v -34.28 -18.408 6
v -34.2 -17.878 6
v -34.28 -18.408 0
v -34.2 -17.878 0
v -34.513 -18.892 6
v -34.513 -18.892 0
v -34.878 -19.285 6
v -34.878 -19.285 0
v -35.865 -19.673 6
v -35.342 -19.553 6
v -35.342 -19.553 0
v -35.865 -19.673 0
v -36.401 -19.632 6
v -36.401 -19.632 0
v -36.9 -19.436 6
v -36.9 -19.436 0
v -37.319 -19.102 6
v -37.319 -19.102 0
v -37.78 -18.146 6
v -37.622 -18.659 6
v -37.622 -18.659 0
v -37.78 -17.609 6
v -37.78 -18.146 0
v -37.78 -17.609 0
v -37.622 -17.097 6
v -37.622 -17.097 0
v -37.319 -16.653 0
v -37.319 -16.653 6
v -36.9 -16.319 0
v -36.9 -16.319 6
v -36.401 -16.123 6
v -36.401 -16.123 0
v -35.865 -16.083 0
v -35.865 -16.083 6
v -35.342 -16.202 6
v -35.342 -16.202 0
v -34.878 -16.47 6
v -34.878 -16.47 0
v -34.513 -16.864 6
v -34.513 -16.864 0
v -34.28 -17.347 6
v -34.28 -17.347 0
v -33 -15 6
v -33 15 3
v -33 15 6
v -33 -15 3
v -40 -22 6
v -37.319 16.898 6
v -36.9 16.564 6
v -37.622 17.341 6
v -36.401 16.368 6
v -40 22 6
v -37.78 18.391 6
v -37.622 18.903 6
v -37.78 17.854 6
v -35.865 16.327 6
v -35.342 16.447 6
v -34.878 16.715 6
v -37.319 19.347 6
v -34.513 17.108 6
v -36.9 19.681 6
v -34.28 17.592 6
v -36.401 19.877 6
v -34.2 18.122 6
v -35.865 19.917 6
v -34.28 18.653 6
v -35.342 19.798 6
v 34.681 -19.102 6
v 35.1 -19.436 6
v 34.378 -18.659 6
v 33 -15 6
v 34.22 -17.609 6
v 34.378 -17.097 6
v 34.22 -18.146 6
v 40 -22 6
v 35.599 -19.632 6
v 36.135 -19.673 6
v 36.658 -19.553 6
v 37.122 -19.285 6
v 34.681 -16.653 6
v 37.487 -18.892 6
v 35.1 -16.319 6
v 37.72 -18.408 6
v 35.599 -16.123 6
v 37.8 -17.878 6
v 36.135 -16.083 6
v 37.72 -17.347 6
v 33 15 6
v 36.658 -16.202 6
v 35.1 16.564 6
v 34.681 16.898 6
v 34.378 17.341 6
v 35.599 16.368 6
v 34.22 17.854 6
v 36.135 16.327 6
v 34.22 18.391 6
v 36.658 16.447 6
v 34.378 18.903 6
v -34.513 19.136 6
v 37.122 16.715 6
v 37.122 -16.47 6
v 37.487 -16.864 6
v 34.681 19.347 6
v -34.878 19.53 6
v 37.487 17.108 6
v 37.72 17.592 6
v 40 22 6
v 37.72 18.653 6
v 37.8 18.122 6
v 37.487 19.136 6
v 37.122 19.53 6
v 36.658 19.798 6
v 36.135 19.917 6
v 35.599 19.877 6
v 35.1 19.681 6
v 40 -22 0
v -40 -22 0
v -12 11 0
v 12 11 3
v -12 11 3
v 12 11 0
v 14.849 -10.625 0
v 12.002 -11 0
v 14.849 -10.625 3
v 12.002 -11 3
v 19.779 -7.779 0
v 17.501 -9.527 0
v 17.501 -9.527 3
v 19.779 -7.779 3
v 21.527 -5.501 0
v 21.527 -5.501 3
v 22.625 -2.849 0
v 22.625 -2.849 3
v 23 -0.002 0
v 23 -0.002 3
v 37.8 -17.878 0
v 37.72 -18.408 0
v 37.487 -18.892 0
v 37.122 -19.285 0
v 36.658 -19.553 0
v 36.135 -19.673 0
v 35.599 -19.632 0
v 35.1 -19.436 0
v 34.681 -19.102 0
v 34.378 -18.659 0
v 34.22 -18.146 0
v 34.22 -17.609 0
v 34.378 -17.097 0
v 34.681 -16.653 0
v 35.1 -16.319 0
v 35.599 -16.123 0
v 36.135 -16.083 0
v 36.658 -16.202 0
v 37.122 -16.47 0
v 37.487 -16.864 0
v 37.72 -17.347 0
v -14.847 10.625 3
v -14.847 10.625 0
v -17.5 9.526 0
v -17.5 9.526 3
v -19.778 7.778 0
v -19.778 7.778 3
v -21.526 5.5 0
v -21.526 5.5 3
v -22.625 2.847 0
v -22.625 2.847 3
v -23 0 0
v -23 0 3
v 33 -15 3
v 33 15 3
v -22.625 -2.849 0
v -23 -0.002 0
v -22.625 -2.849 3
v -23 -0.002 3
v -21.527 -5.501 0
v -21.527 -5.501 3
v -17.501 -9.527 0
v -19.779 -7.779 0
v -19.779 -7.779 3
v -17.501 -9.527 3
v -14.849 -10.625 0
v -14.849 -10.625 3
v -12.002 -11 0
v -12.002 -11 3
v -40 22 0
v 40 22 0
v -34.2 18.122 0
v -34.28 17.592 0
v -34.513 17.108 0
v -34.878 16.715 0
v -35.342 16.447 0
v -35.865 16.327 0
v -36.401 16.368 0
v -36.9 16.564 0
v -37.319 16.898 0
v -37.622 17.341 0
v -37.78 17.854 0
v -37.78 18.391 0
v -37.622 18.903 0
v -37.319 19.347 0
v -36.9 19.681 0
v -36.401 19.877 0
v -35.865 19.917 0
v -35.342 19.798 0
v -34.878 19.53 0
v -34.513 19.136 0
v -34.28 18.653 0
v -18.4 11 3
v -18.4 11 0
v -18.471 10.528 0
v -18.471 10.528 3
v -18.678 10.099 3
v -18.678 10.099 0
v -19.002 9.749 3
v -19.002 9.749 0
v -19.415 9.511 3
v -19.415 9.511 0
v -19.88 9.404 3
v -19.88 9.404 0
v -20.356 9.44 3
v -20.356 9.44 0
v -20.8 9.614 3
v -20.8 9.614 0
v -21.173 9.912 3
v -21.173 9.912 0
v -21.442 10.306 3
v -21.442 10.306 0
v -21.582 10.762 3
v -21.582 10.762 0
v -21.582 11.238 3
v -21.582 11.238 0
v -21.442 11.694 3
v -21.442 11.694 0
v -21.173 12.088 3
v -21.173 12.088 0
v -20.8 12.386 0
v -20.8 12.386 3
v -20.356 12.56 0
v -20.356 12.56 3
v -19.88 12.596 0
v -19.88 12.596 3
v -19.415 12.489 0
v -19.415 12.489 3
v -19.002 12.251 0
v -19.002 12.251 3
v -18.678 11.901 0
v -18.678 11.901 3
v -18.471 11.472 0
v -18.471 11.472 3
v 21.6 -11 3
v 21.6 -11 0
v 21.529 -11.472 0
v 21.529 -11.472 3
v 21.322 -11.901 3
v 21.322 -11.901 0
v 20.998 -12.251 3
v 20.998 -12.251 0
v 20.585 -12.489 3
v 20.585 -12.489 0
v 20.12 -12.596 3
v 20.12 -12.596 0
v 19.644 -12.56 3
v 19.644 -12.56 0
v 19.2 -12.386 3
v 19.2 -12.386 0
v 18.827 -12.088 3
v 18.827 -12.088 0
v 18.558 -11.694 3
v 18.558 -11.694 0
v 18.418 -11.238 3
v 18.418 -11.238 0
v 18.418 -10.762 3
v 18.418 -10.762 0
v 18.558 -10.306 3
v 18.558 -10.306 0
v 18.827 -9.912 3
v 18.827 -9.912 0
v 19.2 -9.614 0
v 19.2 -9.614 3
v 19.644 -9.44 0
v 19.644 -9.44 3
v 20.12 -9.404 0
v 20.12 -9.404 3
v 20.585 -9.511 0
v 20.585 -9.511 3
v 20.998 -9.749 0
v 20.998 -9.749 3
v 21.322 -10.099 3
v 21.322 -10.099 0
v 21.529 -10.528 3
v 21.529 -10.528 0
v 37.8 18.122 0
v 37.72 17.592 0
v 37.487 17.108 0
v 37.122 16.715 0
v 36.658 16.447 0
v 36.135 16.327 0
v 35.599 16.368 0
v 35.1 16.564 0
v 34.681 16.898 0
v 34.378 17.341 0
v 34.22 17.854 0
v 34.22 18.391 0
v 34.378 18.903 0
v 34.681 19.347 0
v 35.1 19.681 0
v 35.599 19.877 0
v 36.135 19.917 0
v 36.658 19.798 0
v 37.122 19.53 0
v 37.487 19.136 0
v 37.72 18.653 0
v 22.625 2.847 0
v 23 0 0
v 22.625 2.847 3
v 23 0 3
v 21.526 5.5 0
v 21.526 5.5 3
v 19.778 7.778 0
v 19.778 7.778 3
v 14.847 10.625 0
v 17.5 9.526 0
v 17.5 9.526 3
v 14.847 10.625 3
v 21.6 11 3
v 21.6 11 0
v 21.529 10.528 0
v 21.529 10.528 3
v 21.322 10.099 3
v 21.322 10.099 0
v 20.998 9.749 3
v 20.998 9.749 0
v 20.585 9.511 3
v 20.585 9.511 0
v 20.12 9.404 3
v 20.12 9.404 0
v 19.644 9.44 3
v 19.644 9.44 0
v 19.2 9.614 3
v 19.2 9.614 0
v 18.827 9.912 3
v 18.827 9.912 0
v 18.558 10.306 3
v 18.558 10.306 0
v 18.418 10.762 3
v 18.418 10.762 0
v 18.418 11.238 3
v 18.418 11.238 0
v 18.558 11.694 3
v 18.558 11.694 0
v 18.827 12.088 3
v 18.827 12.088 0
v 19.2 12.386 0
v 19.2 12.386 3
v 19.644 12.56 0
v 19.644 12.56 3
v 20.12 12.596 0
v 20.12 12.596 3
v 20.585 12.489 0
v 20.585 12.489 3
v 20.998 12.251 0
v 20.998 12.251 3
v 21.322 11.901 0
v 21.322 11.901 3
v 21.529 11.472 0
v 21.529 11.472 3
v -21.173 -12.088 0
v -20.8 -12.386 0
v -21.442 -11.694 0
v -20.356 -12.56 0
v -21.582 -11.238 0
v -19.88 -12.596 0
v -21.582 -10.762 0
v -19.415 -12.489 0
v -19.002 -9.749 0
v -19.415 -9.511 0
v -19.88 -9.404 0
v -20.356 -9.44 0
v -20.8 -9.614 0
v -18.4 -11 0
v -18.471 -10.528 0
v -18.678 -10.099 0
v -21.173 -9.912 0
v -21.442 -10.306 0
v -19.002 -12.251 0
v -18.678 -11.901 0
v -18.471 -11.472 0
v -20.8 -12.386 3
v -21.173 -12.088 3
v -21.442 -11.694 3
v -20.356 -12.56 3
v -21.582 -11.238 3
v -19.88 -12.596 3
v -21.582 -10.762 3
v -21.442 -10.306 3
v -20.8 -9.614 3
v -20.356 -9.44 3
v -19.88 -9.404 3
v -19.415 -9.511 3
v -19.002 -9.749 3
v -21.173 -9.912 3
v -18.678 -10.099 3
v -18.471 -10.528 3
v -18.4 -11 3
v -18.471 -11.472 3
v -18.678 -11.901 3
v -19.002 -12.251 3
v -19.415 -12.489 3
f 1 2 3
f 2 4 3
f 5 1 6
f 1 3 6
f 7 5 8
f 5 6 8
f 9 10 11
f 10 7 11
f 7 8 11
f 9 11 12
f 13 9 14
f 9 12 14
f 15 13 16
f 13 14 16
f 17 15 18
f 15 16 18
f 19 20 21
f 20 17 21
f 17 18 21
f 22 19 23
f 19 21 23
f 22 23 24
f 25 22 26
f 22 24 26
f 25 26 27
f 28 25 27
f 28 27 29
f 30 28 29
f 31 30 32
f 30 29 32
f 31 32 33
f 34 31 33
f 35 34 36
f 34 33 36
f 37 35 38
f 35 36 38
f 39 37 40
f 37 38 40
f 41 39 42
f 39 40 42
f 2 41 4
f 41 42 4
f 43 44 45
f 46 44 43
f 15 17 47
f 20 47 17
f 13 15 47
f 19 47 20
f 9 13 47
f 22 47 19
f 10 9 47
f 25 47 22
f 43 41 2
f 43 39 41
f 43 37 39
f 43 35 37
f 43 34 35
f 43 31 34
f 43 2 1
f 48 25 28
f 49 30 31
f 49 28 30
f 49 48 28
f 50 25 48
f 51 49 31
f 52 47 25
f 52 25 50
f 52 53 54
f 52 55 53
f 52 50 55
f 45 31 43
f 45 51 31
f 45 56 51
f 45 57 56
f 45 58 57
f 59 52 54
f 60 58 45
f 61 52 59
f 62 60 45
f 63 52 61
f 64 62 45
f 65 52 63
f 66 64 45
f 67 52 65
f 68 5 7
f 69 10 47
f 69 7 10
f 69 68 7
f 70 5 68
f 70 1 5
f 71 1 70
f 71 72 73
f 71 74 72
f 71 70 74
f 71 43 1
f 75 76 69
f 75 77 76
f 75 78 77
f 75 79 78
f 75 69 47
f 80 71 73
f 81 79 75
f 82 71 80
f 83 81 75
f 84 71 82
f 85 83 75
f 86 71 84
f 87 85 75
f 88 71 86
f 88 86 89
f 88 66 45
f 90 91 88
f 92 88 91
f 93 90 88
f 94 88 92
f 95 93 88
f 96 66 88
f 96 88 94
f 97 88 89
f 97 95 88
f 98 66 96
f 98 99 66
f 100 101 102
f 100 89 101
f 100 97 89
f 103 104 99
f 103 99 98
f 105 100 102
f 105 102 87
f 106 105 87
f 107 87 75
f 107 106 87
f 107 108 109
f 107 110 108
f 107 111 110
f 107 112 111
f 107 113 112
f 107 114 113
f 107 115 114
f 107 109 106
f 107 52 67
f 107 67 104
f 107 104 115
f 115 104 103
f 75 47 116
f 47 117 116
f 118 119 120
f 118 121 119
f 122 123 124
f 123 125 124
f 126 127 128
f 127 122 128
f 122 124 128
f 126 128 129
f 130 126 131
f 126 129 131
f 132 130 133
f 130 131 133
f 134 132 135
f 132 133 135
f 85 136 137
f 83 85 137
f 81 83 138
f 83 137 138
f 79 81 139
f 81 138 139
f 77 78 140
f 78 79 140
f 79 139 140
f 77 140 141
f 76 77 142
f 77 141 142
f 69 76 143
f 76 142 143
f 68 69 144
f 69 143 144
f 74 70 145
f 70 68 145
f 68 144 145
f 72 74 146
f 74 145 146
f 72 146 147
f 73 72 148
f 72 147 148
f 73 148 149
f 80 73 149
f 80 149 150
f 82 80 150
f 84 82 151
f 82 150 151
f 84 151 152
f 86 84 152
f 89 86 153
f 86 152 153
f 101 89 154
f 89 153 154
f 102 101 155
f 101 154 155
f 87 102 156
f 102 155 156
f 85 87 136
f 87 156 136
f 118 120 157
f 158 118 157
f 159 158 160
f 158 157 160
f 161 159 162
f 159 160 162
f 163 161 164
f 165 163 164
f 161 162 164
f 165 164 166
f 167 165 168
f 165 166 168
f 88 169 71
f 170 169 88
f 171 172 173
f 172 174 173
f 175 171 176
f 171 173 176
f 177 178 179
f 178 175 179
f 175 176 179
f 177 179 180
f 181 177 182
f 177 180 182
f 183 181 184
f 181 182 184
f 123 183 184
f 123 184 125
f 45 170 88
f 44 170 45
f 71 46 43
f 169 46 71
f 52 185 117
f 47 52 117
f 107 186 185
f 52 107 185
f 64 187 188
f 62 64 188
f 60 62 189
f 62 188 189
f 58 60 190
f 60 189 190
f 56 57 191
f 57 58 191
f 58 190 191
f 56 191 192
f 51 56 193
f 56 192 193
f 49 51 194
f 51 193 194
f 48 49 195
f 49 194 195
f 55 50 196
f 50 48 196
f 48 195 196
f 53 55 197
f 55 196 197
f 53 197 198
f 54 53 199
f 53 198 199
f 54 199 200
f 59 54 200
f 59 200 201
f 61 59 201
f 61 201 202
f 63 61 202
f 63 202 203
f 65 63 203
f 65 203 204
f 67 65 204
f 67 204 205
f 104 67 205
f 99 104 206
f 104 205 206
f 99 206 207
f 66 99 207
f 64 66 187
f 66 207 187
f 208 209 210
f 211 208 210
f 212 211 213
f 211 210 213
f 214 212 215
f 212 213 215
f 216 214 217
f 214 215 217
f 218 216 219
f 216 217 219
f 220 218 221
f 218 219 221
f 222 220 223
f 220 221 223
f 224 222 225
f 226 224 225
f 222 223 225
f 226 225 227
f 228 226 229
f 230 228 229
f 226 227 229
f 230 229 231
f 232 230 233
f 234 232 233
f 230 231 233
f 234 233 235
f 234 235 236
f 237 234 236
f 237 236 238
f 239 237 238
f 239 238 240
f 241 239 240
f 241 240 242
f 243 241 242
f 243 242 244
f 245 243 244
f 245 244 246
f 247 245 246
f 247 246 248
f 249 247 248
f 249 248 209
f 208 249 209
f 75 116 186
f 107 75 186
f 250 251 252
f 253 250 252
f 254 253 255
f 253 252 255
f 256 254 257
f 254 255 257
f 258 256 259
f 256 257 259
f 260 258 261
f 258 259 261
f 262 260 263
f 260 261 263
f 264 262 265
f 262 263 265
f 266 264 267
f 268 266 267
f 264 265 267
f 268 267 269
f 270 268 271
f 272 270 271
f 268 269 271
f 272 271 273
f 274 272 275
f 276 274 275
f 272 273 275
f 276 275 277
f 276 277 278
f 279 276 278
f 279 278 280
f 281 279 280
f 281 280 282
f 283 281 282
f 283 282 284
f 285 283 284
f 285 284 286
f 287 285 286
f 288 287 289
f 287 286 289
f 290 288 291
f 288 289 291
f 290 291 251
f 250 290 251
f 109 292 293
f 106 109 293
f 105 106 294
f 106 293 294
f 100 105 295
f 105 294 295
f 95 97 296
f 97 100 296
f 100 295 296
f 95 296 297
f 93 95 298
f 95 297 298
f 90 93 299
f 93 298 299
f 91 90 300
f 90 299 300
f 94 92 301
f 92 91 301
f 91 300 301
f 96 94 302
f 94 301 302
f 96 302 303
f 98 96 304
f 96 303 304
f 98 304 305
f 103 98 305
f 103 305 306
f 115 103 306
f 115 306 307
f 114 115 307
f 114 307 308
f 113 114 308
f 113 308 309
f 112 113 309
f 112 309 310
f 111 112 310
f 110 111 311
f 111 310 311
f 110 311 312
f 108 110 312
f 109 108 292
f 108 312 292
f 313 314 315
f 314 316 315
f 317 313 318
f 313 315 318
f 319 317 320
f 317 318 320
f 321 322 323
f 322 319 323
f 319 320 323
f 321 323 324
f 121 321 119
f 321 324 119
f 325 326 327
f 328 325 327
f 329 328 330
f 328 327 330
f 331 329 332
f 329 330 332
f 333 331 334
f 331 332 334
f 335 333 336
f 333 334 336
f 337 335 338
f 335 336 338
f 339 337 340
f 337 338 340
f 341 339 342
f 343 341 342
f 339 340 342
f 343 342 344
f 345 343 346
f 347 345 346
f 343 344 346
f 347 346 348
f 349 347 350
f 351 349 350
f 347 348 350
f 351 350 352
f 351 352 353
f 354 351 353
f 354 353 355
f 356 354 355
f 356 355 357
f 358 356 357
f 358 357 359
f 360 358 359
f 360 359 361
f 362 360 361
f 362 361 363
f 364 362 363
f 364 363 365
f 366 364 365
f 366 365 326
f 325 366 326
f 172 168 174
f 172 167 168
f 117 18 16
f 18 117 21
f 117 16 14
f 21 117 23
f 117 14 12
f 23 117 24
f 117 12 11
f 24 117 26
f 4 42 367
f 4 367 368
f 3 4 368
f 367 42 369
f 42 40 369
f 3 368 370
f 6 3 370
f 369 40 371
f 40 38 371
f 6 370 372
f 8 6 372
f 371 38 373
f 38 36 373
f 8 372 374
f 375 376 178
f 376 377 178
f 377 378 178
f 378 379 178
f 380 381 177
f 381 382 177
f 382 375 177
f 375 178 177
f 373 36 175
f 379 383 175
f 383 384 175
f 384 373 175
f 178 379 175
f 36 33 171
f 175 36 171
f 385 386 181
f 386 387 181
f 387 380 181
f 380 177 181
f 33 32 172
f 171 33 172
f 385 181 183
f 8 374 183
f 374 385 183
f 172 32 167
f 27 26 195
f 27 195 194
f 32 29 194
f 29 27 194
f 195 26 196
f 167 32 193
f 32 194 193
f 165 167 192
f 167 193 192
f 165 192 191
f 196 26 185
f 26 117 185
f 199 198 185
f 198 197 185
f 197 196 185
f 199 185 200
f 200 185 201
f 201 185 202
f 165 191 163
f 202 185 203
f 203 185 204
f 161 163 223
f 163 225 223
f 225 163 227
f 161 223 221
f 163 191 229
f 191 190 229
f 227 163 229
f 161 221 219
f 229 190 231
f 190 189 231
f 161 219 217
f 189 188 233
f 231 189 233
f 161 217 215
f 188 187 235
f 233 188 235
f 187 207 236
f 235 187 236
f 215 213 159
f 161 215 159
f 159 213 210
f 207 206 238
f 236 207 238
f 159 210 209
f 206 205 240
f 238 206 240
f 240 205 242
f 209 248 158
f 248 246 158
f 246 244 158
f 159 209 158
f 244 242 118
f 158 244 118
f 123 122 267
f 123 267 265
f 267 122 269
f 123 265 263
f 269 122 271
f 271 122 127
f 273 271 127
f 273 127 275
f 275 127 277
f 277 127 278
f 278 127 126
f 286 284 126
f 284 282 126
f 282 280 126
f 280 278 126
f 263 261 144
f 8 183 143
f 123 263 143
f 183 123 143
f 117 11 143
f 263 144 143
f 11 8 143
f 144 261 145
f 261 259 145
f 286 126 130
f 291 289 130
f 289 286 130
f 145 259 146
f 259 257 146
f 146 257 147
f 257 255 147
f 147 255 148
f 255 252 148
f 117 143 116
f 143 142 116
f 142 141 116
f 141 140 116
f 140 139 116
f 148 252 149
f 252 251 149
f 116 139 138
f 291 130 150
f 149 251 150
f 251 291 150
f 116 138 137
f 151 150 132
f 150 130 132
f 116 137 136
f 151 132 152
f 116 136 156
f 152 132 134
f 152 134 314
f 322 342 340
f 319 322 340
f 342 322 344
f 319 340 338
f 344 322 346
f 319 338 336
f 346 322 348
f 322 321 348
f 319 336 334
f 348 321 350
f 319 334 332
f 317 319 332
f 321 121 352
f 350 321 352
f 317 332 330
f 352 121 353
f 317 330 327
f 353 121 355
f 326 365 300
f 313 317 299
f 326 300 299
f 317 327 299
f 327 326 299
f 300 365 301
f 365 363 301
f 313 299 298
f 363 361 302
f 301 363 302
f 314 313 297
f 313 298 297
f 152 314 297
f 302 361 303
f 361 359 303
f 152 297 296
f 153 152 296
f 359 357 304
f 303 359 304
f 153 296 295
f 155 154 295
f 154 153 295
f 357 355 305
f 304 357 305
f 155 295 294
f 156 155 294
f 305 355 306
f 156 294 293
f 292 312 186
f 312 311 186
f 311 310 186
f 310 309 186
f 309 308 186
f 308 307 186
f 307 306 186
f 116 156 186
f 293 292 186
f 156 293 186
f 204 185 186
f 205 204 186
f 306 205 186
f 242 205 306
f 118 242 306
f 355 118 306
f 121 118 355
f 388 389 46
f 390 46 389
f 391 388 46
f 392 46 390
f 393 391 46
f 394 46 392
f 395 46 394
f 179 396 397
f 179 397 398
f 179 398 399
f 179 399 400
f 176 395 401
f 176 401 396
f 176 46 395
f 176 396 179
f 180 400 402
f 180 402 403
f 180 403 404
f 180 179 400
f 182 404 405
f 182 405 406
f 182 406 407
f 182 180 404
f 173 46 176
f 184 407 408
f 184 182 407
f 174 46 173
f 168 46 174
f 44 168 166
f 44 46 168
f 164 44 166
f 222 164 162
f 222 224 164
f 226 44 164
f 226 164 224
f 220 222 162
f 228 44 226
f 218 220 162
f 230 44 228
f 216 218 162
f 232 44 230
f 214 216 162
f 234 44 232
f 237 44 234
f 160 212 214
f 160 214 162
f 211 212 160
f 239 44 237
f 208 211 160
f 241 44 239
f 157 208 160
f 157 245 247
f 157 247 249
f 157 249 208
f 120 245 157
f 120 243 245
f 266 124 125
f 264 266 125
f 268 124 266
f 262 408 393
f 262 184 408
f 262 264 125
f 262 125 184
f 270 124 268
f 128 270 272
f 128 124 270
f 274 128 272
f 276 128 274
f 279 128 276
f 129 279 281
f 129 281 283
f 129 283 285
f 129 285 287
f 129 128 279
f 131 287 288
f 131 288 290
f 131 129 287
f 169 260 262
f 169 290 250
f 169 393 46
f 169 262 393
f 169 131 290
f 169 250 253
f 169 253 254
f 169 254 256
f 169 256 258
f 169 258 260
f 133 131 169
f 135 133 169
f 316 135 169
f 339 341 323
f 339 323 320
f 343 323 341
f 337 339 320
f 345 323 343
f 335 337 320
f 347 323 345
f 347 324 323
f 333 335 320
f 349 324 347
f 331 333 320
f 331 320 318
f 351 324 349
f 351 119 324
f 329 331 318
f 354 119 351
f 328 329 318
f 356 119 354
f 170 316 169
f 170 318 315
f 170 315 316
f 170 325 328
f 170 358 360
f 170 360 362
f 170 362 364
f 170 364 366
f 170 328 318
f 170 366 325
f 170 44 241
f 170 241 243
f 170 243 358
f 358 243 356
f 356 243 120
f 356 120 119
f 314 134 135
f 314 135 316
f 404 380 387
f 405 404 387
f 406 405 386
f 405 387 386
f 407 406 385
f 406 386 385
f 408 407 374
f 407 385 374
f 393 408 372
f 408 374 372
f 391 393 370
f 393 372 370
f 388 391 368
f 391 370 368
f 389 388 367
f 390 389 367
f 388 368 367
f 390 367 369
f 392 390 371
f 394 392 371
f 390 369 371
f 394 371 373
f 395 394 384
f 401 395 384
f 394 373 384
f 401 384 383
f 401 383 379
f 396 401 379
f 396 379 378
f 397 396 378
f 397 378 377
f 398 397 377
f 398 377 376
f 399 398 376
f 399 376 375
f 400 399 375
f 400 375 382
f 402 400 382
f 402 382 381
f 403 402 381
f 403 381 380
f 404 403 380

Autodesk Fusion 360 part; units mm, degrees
sketch "Sketch1" plane through (0, 0, 0) normal (0, 0, 1) x (1, 0, 0)
  line L0 (40, 22) -> (-40, 22)
  line L1 (-40, 22) -> (-40, -22)
  line L2 (-40, -22) -> (40, -22)
  line L3 (40, -22) -> (40, 22)
  line L4 (40, 22) -> (-40, -22) construction
  line L5 (-40, 22) -> (40, -22) construction
  line L6 (33, 15) -> (-33, 15)
  line L7 (-33, 15) -> (-33, -15)
  line L8 (-33, -15) -> (33, -15)
  line L9 (33, -15) -> (33, 15)
  line L10 (33, 15) -> (-33, -15) construction
  line L11 (-33, 15) -> (33, -15) construction
  line L12 (23, 11) -> (-23, 11)
  line L13 (-23, 11) -> (-23, -11)
  line L14 (-23, -11) -> (23, -11)
  line L15 (23, -11) -> (23, 11)
  line L16 (23, 11) -> (-23, -11) construction
  line L17 (-23, 11) -> (23, -11) construction
  line L18 (-40, 18.1224) -> (40, 18.1224) construction
  line L19 (-40, -17.8776) -> (40, -17.8776) construction
  line L20 (-36, 22) -> (-36, -22) construction
  line L21 (36, 22) -> (36, -22) construction
  circle A0 centre (-36, 18.1224) radius 1.8
  circle A1 centre (36, 18.1224) radius 1.8
  circle A2 centre (-36, -17.8776) radius 1.8
  circle A3 centre (36, -17.8776) radius 1.8
  line L22 (-20, 22) -> (-20, -22) construction
  line L23 (0, 22) -> (0, -22) construction
  line L24 (20, 22) -> (20, -22) construction
  dimension "d1" = 80
  dimension "d2" = 44
  dimension "d3" = 66
  dimension "d4" = 30
  dimension "d5" = 46
  dimension "d6" = 22
  dimension "d7" = 36
  dimension "d8" = 72
  dimension "d9" = 4
  dimension "d10" = 3.6
  dimension "d11" = 3.6
  dimension "d12" = 3.6
  dimension "d13" = 3.6
  dimension "d14" = 16
sketch "Sketch2" plane through (0, 0, 0) normal (0, 0, 1) x (1, 0, 0)
extrude "Extrude1" add sketch "Sketch1" along normal blind 3 contours L6 L7 L8 L9
extrude "Extrude2" add sketch "Sketch1" along normal blind 6 contours L0 L1 L2 L3
fillet "Fillet1" radius 11 1 edges at (-23, 11, 1.5)
fillet "Fillet2" radius 11 1 edges at (23, 11, 1.5)
fillet "Fillet3" radius 11 1 edges at (23, -11, 1.5)
fillet "Fillet4" radius 11 1 edges at (-23, -11, 1.5)
sketch "Sketch3" plane through (0, 0, 0) normal (0, 0, 1) x (1, 0, 0)
  circle A0 centre (-20, 11) radius 1.6
  circle A1 centre (-20, -11) radius 1.6
  line L0 (0, 22) -> (0, -22)
  circle A2 centre (20, 11) radius 1.6
  circle A3 centre (20, -11) radius 1.6
  dimension "d29" = 3.2
  dimension "d30" = 3.2
extrude "Extrude3" cut sketch "Sketch3" along normal blind 12 contours A3
extrude "Extrude4" cut sketch "Sketch3" along normal blind 6 contours A2
extrude "Extrude5" cut sketch "Sketch3" along normal blind 8 contours A1
extrude "Extrude6" cut sketch "Sketch3" along normal blind 8 contours A0
